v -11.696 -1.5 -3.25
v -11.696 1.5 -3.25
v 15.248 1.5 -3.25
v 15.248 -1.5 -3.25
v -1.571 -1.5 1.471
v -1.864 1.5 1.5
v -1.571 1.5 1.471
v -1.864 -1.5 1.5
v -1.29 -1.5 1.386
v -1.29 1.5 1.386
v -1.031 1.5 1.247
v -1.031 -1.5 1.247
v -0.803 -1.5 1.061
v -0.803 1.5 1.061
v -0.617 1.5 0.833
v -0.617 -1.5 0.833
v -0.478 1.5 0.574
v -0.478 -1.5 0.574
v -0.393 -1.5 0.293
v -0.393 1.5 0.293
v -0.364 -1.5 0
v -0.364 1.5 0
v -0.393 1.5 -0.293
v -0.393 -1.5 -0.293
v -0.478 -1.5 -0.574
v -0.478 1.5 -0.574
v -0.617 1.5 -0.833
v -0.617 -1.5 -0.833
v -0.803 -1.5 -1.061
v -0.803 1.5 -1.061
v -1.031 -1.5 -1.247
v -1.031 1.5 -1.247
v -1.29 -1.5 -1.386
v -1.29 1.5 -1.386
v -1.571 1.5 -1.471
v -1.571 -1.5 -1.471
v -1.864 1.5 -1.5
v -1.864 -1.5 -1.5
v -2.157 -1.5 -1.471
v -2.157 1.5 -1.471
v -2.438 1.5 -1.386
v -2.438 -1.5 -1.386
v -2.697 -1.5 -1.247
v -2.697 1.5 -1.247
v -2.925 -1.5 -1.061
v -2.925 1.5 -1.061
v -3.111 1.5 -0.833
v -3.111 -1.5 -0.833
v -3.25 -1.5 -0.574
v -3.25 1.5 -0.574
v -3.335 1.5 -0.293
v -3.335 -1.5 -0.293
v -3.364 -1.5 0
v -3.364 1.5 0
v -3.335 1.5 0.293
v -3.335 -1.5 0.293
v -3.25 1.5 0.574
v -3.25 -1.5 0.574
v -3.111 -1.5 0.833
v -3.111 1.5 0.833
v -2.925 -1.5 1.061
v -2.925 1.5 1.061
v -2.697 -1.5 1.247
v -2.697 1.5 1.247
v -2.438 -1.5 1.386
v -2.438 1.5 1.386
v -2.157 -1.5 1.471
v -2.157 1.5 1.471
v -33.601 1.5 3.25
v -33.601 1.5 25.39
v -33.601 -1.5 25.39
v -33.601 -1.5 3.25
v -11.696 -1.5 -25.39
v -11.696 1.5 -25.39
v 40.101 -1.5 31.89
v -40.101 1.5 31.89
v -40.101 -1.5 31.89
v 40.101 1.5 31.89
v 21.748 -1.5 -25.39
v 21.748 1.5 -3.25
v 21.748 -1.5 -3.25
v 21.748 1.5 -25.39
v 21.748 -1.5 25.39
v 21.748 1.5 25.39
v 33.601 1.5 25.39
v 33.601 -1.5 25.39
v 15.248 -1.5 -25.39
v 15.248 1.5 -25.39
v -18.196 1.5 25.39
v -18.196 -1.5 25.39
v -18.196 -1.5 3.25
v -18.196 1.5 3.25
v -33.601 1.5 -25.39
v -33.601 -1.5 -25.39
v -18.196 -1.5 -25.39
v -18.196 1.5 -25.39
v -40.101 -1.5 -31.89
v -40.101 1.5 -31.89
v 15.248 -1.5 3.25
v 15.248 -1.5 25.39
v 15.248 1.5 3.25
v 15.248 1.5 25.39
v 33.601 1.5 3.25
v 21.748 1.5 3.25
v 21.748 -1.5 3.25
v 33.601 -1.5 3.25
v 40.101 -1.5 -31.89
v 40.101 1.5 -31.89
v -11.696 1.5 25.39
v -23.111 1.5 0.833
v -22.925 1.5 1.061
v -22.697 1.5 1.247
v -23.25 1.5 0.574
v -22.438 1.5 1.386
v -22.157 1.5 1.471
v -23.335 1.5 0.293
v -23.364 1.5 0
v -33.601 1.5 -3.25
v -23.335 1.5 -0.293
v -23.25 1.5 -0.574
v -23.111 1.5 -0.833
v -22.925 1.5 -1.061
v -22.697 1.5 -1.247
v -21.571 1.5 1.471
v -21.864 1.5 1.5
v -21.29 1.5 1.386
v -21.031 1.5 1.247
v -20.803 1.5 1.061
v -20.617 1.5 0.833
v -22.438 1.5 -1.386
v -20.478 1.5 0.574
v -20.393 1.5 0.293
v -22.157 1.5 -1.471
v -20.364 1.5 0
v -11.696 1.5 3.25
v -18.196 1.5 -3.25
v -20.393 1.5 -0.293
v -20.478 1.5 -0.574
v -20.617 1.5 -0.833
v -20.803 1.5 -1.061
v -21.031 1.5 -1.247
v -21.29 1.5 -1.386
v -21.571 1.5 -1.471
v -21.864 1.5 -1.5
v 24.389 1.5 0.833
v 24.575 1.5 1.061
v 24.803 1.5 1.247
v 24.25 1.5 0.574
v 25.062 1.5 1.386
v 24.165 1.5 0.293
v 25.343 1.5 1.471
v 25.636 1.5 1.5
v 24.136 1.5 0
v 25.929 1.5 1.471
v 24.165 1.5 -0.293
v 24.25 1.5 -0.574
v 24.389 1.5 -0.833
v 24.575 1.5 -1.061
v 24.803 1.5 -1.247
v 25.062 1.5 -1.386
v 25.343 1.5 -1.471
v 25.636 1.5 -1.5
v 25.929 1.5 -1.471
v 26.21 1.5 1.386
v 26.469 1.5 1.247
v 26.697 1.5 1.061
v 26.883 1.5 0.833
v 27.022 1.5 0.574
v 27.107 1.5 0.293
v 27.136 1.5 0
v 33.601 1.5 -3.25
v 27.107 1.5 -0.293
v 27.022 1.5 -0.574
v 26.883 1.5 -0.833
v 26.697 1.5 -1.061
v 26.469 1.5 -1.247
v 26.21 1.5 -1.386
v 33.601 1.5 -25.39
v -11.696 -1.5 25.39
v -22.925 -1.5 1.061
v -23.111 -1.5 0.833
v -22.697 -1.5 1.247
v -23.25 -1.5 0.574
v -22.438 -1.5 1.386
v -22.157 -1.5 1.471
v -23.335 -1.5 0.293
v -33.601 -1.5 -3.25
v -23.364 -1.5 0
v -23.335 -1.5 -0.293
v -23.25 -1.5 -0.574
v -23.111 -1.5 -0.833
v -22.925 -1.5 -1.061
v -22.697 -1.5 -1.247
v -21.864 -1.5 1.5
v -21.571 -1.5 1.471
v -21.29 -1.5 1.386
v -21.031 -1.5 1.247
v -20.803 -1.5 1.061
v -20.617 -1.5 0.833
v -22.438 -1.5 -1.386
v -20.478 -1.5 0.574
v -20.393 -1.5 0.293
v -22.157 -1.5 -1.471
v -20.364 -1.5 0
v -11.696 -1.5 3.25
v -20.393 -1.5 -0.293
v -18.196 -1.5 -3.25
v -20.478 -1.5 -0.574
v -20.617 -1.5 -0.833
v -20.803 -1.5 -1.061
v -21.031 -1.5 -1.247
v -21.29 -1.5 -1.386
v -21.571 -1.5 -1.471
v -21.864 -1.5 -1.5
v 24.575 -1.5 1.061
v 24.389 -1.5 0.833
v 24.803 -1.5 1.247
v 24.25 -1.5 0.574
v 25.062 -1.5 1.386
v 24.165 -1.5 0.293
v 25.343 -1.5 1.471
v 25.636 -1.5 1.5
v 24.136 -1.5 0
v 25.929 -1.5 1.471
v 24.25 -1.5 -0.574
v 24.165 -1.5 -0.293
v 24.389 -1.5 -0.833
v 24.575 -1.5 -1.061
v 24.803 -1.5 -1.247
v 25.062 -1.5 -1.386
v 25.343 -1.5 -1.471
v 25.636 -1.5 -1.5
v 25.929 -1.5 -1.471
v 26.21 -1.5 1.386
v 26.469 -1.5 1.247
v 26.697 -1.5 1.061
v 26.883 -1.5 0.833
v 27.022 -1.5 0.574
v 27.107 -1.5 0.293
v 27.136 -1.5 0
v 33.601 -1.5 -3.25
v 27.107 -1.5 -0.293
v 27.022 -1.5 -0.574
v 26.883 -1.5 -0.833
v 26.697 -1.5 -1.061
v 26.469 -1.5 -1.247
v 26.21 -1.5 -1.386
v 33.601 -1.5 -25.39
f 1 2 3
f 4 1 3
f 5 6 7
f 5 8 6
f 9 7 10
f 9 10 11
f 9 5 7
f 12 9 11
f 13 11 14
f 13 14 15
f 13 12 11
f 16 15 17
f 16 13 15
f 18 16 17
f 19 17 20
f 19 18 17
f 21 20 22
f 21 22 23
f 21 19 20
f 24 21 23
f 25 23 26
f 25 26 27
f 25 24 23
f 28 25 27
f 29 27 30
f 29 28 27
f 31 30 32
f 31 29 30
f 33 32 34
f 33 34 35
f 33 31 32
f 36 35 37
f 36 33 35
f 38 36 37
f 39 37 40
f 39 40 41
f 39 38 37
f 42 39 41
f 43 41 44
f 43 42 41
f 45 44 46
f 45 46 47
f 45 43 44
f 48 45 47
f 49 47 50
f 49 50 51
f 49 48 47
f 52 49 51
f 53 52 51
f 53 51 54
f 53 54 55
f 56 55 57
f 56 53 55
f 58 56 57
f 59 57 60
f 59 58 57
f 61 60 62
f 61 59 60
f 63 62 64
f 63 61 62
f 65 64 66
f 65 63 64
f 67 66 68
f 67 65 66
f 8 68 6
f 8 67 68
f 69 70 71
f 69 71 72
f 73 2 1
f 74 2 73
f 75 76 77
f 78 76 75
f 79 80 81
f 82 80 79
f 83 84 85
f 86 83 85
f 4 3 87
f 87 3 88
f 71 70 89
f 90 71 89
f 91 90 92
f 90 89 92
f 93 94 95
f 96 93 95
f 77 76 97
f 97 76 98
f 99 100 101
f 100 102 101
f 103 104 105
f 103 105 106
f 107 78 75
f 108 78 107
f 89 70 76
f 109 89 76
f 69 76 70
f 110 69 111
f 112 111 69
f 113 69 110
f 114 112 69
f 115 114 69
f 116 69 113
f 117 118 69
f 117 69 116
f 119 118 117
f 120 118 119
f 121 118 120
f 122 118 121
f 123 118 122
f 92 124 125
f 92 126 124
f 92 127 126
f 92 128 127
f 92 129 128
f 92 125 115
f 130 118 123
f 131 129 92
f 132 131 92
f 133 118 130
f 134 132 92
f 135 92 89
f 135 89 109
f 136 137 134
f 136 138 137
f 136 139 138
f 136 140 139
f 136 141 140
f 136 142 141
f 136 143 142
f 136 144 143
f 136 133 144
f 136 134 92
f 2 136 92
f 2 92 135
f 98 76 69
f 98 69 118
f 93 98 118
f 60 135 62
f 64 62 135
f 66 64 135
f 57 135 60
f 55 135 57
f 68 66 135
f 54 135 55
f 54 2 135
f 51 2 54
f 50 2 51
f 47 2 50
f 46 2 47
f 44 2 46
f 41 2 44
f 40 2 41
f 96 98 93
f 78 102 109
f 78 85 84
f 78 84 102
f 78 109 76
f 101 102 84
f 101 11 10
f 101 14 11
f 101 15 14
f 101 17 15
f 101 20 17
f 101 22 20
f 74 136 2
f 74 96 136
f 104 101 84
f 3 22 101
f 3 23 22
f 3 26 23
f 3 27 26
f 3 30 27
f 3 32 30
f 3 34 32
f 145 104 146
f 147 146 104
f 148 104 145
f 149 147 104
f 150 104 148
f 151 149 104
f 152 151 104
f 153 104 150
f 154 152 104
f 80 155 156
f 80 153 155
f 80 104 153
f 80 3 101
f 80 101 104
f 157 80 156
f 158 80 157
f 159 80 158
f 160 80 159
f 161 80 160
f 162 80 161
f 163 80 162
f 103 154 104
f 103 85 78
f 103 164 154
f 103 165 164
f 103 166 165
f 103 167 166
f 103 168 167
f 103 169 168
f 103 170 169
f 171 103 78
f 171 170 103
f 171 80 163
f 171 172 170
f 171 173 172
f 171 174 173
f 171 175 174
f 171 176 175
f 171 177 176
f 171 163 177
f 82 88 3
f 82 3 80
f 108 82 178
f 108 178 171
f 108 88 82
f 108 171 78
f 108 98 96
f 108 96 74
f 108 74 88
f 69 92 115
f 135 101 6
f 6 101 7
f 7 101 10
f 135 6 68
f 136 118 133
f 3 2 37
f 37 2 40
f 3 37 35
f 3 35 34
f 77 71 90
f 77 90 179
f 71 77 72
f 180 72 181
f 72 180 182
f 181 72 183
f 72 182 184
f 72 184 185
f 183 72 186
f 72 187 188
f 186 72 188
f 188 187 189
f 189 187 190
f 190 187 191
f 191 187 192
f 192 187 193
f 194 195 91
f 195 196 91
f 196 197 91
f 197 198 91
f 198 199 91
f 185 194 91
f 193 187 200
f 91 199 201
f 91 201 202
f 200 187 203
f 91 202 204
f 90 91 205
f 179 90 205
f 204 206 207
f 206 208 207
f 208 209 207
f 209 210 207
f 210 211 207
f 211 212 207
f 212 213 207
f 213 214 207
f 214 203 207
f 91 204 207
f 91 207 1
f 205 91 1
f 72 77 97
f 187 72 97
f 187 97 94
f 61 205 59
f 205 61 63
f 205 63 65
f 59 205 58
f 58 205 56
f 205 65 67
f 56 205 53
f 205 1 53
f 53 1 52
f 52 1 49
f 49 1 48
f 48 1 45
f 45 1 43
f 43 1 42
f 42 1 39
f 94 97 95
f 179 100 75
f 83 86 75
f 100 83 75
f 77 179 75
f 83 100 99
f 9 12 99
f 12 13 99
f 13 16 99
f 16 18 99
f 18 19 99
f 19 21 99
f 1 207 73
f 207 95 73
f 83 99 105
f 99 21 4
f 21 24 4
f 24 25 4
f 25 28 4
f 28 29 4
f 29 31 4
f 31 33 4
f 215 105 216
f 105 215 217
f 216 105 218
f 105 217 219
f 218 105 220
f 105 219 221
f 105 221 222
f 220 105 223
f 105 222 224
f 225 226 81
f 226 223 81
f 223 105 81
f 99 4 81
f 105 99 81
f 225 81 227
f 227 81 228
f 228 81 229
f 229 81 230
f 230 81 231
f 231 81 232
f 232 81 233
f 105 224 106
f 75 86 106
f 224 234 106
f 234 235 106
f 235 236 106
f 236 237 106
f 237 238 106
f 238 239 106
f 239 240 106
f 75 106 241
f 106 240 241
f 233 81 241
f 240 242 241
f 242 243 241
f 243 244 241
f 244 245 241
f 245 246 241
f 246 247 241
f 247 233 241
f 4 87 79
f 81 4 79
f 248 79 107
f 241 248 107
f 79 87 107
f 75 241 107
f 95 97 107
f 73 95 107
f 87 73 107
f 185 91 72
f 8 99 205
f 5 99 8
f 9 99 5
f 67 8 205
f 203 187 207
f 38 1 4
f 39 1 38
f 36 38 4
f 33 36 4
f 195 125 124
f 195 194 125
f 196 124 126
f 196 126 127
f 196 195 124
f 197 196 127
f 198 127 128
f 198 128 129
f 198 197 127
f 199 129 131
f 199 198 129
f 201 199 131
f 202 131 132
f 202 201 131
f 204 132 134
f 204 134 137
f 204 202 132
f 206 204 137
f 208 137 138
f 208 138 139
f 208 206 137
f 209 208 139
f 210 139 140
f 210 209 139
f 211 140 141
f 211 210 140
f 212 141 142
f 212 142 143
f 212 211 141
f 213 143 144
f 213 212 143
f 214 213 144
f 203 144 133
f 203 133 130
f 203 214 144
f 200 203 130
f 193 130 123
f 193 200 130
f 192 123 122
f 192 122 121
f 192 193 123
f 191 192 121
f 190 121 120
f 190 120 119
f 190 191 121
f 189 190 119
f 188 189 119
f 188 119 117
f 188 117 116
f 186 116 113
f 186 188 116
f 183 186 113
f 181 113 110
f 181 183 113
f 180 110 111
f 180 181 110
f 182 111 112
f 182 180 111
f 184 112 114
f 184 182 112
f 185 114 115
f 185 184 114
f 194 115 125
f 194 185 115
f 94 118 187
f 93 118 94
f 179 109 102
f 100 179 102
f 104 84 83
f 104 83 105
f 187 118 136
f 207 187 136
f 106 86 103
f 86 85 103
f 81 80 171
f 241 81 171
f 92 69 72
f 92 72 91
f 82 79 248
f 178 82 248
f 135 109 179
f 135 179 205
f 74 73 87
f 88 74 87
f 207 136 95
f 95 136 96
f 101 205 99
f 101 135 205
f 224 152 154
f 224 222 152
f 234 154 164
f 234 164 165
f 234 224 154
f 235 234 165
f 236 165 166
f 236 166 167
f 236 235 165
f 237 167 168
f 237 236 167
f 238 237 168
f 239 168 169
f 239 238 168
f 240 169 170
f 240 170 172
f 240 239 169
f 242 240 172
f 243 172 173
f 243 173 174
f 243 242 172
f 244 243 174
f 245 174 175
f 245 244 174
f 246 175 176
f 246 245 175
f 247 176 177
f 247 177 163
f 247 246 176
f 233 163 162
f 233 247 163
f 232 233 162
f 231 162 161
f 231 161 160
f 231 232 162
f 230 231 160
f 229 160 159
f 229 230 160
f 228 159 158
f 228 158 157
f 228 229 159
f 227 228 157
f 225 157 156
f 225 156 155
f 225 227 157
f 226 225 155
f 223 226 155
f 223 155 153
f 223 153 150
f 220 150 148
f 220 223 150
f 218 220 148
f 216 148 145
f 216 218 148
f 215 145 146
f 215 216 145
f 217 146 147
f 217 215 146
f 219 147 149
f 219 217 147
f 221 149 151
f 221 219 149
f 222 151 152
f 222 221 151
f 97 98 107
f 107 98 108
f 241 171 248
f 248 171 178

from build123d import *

# Parameters (mm, degrees)
SKETCH1_W           = 80.20256146
SKETCH1_H           = 63.780997334
SKETCH1_R           = 1.5
SKETCH1_W_2         = 15.405665538
SKETCH1_H_2         = 22.140498667
SKETCH1_W_3         = 11.853085899
SKETCH1_W_4         = 26.943810023
BOSS_EXTRUDE1_DEPTH = 1.5


with BuildPart() as part:
    # Sketch1 → Boss-Extrude1 (new, symmetric)
    with BuildSketch(Plane(origin=(0, 0, 0), x_dir=(1, 0, 0), z_dir=(0, 1, 0))):
        Rectangle(SKETCH1_W, SKETCH1_H)
        with Locations(Location((-21.864035064, 0, 0), (0, 0, 270))):
            Circle(SKETCH1_R, mode=Mode.SUBTRACT)
        with Locations(Location((-1.864035064, 0, 0), (0, 0, 270))):
            Circle(SKETCH1_R, mode=Mode.SUBTRACT)
        with Locations(Location((25.635964936, 0, 0), (0, 0, 270))):
            Circle(SKETCH1_R, mode=Mode.SUBTRACT)
        with Locations((-25.898447961, -14.320249334)):
            Rectangle(SKETCH1_W_2, SKETCH1_H_2, mode=Mode.SUBTRACT)
        with Locations((-25.898447961, 14.320249334)):
            Rectangle(SKETCH1_W_2, SKETCH1_H_2, mode=Mode.SUBTRACT)
        with Locations((27.674737781, -14.320249334)):
            Rectangle(SKETCH1_W_3, SKETCH1_H_2, mode=Mode.SUBTRACT)
        with Locations((1.77628982, 14.320249334)):
            Rectangle(SKETCH1_W_4, SKETCH1_H_2, mode=Mode.SUBTRACT)
        with Locations((27.674737781, 14.320249334)):
            Rectangle(SKETCH1_W_3, SKETCH1_H_2, mode=Mode.SUBTRACT)
        with Locations((1.77628982, -14.320249334)):
            Rectangle(SKETCH1_W_4, SKETCH1_H_2, mode=Mode.SUBTRACT)
    extrude(amount=BOSS_EXTRUDE1_DEPTH, both=True)


solid = part.part
